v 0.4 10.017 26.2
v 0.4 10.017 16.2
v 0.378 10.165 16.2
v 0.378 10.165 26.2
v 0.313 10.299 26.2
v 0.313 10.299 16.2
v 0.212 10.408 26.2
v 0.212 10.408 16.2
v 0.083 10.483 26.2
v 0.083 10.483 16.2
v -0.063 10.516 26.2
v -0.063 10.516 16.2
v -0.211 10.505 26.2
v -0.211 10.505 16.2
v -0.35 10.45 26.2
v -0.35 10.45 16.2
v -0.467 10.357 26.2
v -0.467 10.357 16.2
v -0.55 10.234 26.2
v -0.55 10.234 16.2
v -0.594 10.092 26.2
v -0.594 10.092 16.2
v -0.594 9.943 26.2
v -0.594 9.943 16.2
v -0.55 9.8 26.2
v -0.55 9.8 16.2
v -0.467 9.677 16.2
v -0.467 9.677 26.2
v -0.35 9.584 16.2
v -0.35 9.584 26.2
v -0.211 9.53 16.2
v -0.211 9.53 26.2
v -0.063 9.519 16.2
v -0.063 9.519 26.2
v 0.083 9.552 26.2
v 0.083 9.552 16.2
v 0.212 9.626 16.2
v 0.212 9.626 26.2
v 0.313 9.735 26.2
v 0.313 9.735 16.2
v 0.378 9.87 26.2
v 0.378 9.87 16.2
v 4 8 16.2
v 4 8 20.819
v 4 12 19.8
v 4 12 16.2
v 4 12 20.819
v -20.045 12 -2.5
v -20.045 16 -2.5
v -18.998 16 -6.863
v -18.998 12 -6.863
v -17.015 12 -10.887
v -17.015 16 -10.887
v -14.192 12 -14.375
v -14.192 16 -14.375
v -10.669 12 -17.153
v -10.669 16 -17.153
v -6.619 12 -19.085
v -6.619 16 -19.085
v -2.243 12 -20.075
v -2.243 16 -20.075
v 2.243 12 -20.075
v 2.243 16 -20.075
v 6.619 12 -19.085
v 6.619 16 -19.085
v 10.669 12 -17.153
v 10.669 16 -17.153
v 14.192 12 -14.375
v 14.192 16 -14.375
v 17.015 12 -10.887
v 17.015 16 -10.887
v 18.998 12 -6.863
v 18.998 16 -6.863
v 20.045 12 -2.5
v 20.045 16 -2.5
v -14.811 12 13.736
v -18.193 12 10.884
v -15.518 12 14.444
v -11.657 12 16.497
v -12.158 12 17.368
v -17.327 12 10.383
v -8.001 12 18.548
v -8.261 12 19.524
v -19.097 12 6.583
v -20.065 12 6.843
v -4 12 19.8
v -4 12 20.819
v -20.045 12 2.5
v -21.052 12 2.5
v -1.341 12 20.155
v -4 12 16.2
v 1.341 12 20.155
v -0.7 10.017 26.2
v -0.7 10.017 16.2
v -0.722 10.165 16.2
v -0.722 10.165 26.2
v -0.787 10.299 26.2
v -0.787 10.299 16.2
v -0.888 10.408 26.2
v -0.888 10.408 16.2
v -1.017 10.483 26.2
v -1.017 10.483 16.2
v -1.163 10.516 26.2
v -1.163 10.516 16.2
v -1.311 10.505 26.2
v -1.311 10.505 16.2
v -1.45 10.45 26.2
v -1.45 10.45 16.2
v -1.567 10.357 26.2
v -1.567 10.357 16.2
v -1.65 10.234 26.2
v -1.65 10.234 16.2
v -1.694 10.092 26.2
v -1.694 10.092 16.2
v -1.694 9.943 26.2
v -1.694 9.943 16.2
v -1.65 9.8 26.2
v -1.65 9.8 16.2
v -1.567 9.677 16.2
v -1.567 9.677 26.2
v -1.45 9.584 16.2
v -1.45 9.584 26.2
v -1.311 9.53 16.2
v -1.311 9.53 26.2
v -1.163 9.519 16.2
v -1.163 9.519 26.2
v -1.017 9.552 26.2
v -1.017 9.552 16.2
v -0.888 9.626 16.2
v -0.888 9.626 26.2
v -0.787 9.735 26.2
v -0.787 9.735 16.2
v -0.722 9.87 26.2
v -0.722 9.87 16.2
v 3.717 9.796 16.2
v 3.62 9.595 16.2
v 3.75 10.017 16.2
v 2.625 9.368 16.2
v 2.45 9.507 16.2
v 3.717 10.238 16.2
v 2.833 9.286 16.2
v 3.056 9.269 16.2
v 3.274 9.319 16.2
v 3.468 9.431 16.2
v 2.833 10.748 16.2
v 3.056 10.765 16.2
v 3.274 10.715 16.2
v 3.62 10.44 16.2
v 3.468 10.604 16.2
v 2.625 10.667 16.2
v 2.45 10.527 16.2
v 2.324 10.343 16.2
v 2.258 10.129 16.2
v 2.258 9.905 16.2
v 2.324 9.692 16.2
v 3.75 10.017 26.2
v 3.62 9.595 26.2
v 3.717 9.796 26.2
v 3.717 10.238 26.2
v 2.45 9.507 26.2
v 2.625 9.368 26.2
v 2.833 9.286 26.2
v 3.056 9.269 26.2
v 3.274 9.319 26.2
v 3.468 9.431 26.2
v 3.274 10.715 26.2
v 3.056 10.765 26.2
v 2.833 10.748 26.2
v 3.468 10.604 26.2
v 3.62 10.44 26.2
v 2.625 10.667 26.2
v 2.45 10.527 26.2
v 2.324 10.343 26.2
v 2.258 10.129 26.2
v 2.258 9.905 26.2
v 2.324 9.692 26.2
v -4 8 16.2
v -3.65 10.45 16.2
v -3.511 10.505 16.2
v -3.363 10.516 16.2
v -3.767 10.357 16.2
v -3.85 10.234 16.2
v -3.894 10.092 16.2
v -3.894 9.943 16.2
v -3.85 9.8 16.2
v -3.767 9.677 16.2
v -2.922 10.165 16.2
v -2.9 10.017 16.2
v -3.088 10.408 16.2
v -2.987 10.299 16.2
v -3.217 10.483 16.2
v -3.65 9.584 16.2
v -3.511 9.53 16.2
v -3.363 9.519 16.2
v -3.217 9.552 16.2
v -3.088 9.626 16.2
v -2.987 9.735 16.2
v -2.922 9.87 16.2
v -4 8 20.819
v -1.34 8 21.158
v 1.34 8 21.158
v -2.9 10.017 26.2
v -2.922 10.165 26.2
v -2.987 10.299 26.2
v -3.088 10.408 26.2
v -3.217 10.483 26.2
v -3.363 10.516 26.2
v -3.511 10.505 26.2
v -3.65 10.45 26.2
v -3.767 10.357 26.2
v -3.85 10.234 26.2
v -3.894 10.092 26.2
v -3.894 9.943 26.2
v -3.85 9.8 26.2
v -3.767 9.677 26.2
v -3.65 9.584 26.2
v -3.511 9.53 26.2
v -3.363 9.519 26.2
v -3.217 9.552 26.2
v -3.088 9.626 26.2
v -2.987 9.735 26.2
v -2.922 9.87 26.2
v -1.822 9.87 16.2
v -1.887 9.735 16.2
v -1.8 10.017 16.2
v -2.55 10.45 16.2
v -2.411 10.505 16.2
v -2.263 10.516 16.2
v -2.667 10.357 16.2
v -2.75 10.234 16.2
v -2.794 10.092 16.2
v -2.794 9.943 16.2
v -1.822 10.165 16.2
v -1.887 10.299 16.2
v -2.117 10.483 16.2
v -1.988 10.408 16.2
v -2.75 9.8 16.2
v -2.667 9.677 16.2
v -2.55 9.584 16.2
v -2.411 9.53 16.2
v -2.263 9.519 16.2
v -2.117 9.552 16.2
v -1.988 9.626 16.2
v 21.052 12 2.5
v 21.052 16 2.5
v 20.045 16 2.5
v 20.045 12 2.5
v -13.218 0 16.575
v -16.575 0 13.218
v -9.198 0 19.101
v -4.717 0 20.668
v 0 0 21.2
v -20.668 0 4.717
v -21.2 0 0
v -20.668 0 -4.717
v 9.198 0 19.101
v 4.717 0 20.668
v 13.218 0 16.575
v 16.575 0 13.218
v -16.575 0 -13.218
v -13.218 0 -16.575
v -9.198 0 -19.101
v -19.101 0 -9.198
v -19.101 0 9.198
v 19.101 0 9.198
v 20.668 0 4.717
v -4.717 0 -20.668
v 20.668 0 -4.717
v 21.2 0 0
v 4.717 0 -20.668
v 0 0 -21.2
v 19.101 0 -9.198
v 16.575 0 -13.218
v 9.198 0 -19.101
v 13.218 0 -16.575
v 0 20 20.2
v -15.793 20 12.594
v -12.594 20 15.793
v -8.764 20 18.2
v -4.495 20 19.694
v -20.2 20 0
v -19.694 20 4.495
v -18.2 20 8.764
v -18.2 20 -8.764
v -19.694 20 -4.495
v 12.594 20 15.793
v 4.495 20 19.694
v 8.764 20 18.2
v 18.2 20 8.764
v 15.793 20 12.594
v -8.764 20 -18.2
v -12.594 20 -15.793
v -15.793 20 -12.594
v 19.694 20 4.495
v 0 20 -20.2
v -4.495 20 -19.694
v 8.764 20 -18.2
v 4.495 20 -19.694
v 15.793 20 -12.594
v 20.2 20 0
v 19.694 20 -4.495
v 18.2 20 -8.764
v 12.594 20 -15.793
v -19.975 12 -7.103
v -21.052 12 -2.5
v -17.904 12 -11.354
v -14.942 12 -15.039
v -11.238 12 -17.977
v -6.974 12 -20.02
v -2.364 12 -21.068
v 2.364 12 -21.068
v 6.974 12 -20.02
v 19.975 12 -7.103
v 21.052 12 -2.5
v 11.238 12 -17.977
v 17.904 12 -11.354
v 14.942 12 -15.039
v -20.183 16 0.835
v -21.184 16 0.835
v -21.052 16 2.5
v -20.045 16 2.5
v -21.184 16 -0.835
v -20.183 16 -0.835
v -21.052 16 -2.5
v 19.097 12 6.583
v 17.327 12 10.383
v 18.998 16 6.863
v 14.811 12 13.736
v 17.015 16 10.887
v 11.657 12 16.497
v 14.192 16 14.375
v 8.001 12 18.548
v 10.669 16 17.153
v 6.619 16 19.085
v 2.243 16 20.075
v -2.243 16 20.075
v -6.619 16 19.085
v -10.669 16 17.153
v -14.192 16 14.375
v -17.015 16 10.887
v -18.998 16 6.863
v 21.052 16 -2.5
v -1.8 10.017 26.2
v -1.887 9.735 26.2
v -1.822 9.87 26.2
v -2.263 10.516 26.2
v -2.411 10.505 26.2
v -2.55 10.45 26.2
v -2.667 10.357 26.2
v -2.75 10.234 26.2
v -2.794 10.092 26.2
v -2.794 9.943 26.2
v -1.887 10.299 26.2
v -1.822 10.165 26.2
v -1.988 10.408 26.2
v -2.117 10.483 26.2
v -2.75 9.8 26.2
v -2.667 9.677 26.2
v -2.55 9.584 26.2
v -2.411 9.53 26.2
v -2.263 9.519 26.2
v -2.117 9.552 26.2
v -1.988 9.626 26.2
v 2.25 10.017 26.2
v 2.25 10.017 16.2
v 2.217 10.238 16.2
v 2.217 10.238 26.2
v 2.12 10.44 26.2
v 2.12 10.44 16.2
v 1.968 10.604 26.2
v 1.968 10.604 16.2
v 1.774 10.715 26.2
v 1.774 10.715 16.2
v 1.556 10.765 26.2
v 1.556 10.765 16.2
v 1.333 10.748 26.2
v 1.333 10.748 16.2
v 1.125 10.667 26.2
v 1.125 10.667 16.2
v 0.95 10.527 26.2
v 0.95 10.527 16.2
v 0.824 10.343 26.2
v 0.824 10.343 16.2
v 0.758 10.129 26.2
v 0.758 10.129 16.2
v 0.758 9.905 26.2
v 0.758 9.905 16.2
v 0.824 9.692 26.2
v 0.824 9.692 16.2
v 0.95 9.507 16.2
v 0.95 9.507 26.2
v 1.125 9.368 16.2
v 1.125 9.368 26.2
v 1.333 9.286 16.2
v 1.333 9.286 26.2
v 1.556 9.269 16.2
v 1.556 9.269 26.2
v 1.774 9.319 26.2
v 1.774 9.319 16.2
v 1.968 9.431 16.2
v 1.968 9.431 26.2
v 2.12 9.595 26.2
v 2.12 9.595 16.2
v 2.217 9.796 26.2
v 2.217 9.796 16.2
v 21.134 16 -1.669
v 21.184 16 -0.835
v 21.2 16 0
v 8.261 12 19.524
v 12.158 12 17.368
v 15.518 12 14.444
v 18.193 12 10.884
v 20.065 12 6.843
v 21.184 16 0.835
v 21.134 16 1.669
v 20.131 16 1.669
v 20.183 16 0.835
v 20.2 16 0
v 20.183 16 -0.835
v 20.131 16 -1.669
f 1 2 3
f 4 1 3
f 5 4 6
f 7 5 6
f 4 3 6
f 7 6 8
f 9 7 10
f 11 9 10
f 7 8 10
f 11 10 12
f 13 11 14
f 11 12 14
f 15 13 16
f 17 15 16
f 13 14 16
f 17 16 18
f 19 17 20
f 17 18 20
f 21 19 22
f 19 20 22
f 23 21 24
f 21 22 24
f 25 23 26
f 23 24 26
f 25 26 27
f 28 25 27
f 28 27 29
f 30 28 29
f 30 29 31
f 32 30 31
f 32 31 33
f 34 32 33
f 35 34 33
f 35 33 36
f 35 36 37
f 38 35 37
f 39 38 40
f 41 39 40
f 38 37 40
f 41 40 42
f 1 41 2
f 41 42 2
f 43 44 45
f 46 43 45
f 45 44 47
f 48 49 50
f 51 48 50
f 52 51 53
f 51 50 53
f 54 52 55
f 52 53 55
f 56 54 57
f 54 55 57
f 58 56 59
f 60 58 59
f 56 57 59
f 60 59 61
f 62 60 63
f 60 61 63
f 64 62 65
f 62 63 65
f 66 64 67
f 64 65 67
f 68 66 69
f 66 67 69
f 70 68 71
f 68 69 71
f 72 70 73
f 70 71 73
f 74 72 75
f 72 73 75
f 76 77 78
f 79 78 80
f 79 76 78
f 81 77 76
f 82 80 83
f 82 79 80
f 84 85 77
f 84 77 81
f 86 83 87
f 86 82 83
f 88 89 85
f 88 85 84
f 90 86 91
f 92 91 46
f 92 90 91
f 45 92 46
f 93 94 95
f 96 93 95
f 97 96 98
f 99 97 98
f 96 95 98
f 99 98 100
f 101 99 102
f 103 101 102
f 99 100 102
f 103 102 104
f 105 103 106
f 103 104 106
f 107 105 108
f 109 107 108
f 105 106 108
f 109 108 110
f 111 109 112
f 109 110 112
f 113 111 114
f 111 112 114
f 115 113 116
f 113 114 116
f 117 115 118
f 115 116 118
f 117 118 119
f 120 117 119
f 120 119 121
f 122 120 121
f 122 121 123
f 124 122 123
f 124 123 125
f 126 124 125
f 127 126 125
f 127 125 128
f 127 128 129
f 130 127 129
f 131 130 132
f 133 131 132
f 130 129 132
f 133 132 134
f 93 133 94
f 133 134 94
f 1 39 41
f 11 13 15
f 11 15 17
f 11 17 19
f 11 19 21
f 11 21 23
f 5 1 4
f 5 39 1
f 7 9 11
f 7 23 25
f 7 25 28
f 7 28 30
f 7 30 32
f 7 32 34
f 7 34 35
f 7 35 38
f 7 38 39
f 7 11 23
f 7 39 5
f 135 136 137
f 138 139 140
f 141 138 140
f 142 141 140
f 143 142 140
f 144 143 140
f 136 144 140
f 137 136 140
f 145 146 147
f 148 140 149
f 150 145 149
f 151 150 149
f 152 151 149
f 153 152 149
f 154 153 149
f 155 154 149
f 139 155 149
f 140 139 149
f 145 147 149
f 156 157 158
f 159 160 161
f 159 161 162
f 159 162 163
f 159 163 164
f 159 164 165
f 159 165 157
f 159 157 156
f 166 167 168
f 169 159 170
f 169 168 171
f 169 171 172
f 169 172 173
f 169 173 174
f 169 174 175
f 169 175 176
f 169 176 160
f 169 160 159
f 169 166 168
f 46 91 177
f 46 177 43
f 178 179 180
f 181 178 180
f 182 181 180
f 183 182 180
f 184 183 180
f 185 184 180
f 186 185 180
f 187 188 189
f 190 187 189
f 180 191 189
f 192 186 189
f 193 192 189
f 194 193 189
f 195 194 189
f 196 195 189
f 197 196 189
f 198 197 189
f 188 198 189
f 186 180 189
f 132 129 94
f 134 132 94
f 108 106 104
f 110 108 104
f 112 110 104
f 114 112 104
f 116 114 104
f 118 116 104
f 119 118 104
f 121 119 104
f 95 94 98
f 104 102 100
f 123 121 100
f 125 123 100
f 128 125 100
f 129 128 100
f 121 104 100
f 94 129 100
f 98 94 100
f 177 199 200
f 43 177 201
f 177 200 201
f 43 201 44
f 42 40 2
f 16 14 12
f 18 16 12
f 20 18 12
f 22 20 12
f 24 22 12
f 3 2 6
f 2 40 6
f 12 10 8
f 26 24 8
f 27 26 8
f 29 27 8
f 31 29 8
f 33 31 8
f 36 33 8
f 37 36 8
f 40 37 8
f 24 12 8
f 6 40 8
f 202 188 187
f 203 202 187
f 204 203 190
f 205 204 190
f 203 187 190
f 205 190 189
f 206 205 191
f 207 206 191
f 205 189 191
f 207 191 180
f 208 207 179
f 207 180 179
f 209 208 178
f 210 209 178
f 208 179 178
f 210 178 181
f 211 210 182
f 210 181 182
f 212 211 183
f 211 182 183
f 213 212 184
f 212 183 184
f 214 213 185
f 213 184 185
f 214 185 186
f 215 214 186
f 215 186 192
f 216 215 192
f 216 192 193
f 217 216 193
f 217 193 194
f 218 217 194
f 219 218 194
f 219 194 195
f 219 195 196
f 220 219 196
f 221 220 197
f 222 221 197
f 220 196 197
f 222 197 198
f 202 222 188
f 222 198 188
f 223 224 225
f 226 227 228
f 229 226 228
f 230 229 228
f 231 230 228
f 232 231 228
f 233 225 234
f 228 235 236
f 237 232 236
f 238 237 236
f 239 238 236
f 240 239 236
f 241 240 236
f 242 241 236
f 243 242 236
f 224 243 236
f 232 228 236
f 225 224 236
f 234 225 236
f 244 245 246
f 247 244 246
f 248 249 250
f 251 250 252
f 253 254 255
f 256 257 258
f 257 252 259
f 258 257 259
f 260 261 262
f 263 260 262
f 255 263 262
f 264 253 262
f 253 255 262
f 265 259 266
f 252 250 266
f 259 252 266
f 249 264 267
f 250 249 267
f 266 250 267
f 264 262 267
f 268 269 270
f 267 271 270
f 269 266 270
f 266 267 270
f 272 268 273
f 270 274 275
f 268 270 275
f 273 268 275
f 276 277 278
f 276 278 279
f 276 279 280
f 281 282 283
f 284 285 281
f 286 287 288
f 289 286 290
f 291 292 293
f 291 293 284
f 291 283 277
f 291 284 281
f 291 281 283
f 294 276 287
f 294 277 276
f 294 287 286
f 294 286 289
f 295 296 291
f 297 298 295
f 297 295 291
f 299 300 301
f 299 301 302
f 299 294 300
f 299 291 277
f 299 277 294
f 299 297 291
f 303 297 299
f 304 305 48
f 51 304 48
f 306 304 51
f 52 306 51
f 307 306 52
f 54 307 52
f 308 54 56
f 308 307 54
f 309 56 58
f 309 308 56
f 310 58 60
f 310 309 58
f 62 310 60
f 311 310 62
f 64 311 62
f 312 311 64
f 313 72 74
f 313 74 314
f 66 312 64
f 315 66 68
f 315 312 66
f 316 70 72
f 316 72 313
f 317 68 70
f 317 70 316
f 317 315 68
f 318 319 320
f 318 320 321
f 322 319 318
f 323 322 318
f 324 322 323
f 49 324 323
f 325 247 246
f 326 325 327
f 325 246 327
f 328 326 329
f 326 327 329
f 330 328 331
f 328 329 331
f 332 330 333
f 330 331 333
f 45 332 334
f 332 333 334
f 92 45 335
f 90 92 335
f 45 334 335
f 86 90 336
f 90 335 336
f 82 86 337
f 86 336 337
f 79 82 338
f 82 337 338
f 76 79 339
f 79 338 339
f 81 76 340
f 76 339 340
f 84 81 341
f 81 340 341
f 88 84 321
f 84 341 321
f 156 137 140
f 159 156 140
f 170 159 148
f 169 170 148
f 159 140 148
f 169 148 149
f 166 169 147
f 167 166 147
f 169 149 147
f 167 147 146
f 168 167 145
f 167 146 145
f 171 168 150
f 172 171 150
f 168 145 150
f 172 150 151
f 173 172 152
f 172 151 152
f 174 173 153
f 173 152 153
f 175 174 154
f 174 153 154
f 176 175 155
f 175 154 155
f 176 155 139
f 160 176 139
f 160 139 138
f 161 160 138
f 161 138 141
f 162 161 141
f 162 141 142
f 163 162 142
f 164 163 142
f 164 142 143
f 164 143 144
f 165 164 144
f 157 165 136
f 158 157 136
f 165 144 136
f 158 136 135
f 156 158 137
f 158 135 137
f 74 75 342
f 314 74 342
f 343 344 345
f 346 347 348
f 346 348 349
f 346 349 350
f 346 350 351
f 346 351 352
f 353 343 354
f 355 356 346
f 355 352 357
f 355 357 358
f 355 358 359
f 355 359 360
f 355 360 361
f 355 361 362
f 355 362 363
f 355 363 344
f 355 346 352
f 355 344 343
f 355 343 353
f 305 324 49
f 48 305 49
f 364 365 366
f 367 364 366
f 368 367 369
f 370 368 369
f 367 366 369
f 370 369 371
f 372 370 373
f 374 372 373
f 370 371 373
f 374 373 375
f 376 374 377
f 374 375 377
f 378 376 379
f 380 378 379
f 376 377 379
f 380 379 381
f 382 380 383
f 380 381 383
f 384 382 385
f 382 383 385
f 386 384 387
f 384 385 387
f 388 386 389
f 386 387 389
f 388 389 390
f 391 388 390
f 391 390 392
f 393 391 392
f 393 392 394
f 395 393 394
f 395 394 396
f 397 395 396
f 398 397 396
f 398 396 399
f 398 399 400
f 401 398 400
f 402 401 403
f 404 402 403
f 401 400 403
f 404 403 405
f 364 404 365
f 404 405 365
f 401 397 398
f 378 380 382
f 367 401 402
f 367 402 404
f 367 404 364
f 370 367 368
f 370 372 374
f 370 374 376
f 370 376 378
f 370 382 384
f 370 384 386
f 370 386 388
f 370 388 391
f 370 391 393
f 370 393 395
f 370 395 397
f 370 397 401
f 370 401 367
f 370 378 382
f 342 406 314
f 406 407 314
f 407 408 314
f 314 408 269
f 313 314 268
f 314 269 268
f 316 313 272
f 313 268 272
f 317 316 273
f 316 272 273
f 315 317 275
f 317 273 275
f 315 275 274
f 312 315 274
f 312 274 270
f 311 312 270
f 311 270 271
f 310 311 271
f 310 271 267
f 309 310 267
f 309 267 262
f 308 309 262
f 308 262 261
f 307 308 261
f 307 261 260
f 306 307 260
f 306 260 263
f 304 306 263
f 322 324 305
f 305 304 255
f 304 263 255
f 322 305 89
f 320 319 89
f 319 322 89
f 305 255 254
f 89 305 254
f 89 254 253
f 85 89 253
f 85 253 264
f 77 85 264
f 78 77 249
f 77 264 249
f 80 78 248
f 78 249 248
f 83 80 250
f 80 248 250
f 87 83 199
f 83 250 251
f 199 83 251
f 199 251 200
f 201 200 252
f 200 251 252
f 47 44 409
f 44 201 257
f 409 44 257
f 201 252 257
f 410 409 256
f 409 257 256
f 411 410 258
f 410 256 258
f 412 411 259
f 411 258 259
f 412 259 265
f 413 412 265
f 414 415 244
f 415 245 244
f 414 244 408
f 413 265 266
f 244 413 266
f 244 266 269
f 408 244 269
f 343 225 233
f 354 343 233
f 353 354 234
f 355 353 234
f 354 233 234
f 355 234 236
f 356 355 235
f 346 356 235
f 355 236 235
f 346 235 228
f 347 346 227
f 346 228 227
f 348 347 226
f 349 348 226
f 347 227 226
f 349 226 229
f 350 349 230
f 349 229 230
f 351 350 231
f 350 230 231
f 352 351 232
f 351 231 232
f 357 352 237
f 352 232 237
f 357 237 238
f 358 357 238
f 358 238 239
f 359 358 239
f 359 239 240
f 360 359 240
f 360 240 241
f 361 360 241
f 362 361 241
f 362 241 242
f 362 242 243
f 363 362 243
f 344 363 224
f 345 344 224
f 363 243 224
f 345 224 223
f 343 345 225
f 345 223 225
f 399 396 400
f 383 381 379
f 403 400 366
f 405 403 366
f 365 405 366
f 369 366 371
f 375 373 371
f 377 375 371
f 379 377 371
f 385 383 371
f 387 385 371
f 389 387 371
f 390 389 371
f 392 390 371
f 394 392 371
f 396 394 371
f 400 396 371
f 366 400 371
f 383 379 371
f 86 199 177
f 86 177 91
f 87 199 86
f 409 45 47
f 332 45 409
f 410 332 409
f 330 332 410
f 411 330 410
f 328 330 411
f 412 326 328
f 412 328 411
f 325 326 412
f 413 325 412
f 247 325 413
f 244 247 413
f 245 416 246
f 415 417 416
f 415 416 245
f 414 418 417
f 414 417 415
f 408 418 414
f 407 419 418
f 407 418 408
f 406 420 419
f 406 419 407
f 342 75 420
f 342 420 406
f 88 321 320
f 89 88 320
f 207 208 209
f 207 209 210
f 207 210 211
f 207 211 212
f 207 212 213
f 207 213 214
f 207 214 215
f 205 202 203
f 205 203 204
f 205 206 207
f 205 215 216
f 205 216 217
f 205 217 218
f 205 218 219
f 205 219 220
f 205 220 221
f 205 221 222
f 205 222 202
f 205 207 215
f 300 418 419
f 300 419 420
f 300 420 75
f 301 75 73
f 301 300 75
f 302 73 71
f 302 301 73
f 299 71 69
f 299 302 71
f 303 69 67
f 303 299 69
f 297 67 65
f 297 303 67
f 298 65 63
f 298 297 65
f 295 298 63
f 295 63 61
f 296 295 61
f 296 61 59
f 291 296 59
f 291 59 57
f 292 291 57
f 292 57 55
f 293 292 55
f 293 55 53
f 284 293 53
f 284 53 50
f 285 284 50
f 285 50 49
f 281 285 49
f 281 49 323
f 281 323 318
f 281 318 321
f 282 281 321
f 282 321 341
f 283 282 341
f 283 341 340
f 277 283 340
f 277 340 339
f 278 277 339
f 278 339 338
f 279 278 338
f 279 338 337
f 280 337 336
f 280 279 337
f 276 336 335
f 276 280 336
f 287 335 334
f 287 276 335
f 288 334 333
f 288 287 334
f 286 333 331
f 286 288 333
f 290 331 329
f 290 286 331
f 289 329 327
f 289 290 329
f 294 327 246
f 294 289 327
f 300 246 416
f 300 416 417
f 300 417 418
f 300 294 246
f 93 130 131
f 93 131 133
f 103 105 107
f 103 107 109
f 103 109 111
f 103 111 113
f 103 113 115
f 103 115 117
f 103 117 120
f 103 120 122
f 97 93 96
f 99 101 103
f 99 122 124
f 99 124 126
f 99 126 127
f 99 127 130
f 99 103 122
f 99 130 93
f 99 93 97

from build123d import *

# Parameters (mm, degrees)
SKETCH1_R             = 21.2
BOSS_EXTRUDE1_DEPTH   = 20
SKETCH2_OUTSIDE_W     = 57.042
SKETCH2_OUTSIDE_H     = 57.042
SKETCH2_OUTSIDE_R     = 20.2
CUT_EXTRUDE1_DEPTH    = 4
SKETCH3_OUTSIDE_W     = 57.042
SKETCH3_OUTSIDE_H     = 57.042
CUT_EXTRUDE2_DEPTH    = 4
SKETCH4_W             = 8
SKETCH4_H             = 4
CUT_EXTRUDE3_DEPTH    = 5
SKETCH5_R             = 0.75
BOSS_EXTRUDE3_DEPTH   = 10
BOSS_EXTRUDE3_2_DEPTH = 10
SKETCH5_R_2           = 0.5
BOSS_EXTRUDE3_3_DEPTH = 10
BOSS_EXTRUDE3_4_DEPTH = 10
BOSS_EXTRUDE3_5_DEPTH = 10
BOSS_EXTRUDE3_6_DEPTH = 10


with BuildPart() as part:
    # Sketch1 → Boss-Extrude1 (new body)
    with BuildSketch(Plane(origin=(0, 0, 0), x_dir=(1, 0, 0), z_dir=(0, 1, 0))):
        Circle(SKETCH1_R)
    extrude(amount=BOSS_EXTRUDE1_DEPTH)

    # Sketch2 outside → Cut-Extrude1 (cut)
    with BuildSketch(Plane(origin=(0, 20, 0), x_dir=(1, 0, 0), z_dir=(0, 1, 0))):
        Rectangle(SKETCH2_OUTSIDE_W, SKETCH2_OUTSIDE_H)
        Circle(SKETCH2_OUTSIDE_R, mode=Mode.SUBTRACT)
    extrude(amount=-CUT_EXTRUDE1_DEPTH, mode=Mode.SUBTRACT)

    # Sketch3 outside → Cut-Extrude2 (cut)
    with BuildSketch(Plane(origin=(0, 16, 0), x_dir=(1, 0, 0), z_dir=(0, 1, 0))):
        Rectangle(SKETCH3_OUTSIDE_W, SKETCH3_OUTSIDE_H)
        with BuildLine():
            Line((20.044700048, 2.5), (23.037339055, 2.5))
            Line((23.037339055, 2.5), (23.037339055, -2.5))
            Line((23.037339055, -2.5), (20.044700048, -2.5))
            ThreePointArc((20.044700048, -2.5), (0, -20.2), (-20.044700048, -2.5))
            Line((-20.044700048, -2.5), (-23.037339055, -2.5))
            Line((-23.037339055, -2.5), (-23.037339055, 2.5))
            Line((-23.037339055, 2.5), (-20.044700048, 2.5))
            ThreePointArc((-20.044700048, 2.5), (0, 20.2), (20.044700048, 2.5))
        make_face(mode=Mode.SUBTRACT)
    extrude(amount=-CUT_EXTRUDE2_DEPTH, mode=Mode.SUBTRACT)

    # Sketch4 → Cut-Extrude3 (cut)
    with BuildSketch(Plane.XY.offset(21.2)):
        with Locations((0, 10)):
            Rectangle(SKETCH4_W, SKETCH4_H)
    extrude(amount=-CUT_EXTRUDE3_DEPTH, mode=Mode.SUBTRACT)


with BuildPart() as body_2:
    # Sketch5 → Boss-Extrude3 (new body)
    with BuildSketch(Plane.XY.offset(16.2)):
        with Locations((3, 10.017134532)):
            Circle(SKETCH5_R)
    extrude(amount=BOSS_EXTRUDE3_DEPTH)


with BuildPart() as body_3:
    # Sketch5 → Boss-Extrude3 2 (new body)
    with BuildSketch(Plane.XY.offset(16.2)):
        with Locations((1.5, 10.017134532)):
            Circle(SKETCH5_R)
    extrude(amount=BOSS_EXTRUDE3_2_DEPTH)


with BuildPart() as body_4:
    # Sketch5 → Boss-Extrude3 3 (new body)
    with BuildSketch(Plane.XY.offset(16.2)):
        with Locations((-3.4, 10.017134532)):
            Circle(SKETCH5_R_2)
    extrude(amount=BOSS_EXTRUDE3_3_DEPTH)


with BuildPart() as body_5:
    # Sketch5 → Boss-Extrude3 4 (new body)
    with BuildSketch(Plane.XY.offset(16.2)):
        with Locations((-2.3, 10.017134532)):
            Circle(SKETCH5_R_2)
    extrude(amount=BOSS_EXTRUDE3_4_DEPTH)


with BuildPart() as body_6:
    # Sketch5 → Boss-Extrude3 5 (new body)
    with BuildSketch(Plane.XY.offset(16.2)):
        with Locations((-1.2, 10.017134532)):
            Circle(SKETCH5_R_2)
    extrude(amount=BOSS_EXTRUDE3_5_DEPTH)


with BuildPart() as body_7:
    # Sketch5 → Boss-Extrude3 6 (new body)
    with BuildSketch(Plane.XY.offset(16.2)):
        with Locations((-0.1, 10.017134532)):
            Circle(SKETCH5_R_2)
    extrude(amount=BOSS_EXTRUDE3_6_DEPTH)


solid = Compound([part.part, body_2.part, body_3.part, body_4.part, body_5.part, body_6.part, body_7.part])
